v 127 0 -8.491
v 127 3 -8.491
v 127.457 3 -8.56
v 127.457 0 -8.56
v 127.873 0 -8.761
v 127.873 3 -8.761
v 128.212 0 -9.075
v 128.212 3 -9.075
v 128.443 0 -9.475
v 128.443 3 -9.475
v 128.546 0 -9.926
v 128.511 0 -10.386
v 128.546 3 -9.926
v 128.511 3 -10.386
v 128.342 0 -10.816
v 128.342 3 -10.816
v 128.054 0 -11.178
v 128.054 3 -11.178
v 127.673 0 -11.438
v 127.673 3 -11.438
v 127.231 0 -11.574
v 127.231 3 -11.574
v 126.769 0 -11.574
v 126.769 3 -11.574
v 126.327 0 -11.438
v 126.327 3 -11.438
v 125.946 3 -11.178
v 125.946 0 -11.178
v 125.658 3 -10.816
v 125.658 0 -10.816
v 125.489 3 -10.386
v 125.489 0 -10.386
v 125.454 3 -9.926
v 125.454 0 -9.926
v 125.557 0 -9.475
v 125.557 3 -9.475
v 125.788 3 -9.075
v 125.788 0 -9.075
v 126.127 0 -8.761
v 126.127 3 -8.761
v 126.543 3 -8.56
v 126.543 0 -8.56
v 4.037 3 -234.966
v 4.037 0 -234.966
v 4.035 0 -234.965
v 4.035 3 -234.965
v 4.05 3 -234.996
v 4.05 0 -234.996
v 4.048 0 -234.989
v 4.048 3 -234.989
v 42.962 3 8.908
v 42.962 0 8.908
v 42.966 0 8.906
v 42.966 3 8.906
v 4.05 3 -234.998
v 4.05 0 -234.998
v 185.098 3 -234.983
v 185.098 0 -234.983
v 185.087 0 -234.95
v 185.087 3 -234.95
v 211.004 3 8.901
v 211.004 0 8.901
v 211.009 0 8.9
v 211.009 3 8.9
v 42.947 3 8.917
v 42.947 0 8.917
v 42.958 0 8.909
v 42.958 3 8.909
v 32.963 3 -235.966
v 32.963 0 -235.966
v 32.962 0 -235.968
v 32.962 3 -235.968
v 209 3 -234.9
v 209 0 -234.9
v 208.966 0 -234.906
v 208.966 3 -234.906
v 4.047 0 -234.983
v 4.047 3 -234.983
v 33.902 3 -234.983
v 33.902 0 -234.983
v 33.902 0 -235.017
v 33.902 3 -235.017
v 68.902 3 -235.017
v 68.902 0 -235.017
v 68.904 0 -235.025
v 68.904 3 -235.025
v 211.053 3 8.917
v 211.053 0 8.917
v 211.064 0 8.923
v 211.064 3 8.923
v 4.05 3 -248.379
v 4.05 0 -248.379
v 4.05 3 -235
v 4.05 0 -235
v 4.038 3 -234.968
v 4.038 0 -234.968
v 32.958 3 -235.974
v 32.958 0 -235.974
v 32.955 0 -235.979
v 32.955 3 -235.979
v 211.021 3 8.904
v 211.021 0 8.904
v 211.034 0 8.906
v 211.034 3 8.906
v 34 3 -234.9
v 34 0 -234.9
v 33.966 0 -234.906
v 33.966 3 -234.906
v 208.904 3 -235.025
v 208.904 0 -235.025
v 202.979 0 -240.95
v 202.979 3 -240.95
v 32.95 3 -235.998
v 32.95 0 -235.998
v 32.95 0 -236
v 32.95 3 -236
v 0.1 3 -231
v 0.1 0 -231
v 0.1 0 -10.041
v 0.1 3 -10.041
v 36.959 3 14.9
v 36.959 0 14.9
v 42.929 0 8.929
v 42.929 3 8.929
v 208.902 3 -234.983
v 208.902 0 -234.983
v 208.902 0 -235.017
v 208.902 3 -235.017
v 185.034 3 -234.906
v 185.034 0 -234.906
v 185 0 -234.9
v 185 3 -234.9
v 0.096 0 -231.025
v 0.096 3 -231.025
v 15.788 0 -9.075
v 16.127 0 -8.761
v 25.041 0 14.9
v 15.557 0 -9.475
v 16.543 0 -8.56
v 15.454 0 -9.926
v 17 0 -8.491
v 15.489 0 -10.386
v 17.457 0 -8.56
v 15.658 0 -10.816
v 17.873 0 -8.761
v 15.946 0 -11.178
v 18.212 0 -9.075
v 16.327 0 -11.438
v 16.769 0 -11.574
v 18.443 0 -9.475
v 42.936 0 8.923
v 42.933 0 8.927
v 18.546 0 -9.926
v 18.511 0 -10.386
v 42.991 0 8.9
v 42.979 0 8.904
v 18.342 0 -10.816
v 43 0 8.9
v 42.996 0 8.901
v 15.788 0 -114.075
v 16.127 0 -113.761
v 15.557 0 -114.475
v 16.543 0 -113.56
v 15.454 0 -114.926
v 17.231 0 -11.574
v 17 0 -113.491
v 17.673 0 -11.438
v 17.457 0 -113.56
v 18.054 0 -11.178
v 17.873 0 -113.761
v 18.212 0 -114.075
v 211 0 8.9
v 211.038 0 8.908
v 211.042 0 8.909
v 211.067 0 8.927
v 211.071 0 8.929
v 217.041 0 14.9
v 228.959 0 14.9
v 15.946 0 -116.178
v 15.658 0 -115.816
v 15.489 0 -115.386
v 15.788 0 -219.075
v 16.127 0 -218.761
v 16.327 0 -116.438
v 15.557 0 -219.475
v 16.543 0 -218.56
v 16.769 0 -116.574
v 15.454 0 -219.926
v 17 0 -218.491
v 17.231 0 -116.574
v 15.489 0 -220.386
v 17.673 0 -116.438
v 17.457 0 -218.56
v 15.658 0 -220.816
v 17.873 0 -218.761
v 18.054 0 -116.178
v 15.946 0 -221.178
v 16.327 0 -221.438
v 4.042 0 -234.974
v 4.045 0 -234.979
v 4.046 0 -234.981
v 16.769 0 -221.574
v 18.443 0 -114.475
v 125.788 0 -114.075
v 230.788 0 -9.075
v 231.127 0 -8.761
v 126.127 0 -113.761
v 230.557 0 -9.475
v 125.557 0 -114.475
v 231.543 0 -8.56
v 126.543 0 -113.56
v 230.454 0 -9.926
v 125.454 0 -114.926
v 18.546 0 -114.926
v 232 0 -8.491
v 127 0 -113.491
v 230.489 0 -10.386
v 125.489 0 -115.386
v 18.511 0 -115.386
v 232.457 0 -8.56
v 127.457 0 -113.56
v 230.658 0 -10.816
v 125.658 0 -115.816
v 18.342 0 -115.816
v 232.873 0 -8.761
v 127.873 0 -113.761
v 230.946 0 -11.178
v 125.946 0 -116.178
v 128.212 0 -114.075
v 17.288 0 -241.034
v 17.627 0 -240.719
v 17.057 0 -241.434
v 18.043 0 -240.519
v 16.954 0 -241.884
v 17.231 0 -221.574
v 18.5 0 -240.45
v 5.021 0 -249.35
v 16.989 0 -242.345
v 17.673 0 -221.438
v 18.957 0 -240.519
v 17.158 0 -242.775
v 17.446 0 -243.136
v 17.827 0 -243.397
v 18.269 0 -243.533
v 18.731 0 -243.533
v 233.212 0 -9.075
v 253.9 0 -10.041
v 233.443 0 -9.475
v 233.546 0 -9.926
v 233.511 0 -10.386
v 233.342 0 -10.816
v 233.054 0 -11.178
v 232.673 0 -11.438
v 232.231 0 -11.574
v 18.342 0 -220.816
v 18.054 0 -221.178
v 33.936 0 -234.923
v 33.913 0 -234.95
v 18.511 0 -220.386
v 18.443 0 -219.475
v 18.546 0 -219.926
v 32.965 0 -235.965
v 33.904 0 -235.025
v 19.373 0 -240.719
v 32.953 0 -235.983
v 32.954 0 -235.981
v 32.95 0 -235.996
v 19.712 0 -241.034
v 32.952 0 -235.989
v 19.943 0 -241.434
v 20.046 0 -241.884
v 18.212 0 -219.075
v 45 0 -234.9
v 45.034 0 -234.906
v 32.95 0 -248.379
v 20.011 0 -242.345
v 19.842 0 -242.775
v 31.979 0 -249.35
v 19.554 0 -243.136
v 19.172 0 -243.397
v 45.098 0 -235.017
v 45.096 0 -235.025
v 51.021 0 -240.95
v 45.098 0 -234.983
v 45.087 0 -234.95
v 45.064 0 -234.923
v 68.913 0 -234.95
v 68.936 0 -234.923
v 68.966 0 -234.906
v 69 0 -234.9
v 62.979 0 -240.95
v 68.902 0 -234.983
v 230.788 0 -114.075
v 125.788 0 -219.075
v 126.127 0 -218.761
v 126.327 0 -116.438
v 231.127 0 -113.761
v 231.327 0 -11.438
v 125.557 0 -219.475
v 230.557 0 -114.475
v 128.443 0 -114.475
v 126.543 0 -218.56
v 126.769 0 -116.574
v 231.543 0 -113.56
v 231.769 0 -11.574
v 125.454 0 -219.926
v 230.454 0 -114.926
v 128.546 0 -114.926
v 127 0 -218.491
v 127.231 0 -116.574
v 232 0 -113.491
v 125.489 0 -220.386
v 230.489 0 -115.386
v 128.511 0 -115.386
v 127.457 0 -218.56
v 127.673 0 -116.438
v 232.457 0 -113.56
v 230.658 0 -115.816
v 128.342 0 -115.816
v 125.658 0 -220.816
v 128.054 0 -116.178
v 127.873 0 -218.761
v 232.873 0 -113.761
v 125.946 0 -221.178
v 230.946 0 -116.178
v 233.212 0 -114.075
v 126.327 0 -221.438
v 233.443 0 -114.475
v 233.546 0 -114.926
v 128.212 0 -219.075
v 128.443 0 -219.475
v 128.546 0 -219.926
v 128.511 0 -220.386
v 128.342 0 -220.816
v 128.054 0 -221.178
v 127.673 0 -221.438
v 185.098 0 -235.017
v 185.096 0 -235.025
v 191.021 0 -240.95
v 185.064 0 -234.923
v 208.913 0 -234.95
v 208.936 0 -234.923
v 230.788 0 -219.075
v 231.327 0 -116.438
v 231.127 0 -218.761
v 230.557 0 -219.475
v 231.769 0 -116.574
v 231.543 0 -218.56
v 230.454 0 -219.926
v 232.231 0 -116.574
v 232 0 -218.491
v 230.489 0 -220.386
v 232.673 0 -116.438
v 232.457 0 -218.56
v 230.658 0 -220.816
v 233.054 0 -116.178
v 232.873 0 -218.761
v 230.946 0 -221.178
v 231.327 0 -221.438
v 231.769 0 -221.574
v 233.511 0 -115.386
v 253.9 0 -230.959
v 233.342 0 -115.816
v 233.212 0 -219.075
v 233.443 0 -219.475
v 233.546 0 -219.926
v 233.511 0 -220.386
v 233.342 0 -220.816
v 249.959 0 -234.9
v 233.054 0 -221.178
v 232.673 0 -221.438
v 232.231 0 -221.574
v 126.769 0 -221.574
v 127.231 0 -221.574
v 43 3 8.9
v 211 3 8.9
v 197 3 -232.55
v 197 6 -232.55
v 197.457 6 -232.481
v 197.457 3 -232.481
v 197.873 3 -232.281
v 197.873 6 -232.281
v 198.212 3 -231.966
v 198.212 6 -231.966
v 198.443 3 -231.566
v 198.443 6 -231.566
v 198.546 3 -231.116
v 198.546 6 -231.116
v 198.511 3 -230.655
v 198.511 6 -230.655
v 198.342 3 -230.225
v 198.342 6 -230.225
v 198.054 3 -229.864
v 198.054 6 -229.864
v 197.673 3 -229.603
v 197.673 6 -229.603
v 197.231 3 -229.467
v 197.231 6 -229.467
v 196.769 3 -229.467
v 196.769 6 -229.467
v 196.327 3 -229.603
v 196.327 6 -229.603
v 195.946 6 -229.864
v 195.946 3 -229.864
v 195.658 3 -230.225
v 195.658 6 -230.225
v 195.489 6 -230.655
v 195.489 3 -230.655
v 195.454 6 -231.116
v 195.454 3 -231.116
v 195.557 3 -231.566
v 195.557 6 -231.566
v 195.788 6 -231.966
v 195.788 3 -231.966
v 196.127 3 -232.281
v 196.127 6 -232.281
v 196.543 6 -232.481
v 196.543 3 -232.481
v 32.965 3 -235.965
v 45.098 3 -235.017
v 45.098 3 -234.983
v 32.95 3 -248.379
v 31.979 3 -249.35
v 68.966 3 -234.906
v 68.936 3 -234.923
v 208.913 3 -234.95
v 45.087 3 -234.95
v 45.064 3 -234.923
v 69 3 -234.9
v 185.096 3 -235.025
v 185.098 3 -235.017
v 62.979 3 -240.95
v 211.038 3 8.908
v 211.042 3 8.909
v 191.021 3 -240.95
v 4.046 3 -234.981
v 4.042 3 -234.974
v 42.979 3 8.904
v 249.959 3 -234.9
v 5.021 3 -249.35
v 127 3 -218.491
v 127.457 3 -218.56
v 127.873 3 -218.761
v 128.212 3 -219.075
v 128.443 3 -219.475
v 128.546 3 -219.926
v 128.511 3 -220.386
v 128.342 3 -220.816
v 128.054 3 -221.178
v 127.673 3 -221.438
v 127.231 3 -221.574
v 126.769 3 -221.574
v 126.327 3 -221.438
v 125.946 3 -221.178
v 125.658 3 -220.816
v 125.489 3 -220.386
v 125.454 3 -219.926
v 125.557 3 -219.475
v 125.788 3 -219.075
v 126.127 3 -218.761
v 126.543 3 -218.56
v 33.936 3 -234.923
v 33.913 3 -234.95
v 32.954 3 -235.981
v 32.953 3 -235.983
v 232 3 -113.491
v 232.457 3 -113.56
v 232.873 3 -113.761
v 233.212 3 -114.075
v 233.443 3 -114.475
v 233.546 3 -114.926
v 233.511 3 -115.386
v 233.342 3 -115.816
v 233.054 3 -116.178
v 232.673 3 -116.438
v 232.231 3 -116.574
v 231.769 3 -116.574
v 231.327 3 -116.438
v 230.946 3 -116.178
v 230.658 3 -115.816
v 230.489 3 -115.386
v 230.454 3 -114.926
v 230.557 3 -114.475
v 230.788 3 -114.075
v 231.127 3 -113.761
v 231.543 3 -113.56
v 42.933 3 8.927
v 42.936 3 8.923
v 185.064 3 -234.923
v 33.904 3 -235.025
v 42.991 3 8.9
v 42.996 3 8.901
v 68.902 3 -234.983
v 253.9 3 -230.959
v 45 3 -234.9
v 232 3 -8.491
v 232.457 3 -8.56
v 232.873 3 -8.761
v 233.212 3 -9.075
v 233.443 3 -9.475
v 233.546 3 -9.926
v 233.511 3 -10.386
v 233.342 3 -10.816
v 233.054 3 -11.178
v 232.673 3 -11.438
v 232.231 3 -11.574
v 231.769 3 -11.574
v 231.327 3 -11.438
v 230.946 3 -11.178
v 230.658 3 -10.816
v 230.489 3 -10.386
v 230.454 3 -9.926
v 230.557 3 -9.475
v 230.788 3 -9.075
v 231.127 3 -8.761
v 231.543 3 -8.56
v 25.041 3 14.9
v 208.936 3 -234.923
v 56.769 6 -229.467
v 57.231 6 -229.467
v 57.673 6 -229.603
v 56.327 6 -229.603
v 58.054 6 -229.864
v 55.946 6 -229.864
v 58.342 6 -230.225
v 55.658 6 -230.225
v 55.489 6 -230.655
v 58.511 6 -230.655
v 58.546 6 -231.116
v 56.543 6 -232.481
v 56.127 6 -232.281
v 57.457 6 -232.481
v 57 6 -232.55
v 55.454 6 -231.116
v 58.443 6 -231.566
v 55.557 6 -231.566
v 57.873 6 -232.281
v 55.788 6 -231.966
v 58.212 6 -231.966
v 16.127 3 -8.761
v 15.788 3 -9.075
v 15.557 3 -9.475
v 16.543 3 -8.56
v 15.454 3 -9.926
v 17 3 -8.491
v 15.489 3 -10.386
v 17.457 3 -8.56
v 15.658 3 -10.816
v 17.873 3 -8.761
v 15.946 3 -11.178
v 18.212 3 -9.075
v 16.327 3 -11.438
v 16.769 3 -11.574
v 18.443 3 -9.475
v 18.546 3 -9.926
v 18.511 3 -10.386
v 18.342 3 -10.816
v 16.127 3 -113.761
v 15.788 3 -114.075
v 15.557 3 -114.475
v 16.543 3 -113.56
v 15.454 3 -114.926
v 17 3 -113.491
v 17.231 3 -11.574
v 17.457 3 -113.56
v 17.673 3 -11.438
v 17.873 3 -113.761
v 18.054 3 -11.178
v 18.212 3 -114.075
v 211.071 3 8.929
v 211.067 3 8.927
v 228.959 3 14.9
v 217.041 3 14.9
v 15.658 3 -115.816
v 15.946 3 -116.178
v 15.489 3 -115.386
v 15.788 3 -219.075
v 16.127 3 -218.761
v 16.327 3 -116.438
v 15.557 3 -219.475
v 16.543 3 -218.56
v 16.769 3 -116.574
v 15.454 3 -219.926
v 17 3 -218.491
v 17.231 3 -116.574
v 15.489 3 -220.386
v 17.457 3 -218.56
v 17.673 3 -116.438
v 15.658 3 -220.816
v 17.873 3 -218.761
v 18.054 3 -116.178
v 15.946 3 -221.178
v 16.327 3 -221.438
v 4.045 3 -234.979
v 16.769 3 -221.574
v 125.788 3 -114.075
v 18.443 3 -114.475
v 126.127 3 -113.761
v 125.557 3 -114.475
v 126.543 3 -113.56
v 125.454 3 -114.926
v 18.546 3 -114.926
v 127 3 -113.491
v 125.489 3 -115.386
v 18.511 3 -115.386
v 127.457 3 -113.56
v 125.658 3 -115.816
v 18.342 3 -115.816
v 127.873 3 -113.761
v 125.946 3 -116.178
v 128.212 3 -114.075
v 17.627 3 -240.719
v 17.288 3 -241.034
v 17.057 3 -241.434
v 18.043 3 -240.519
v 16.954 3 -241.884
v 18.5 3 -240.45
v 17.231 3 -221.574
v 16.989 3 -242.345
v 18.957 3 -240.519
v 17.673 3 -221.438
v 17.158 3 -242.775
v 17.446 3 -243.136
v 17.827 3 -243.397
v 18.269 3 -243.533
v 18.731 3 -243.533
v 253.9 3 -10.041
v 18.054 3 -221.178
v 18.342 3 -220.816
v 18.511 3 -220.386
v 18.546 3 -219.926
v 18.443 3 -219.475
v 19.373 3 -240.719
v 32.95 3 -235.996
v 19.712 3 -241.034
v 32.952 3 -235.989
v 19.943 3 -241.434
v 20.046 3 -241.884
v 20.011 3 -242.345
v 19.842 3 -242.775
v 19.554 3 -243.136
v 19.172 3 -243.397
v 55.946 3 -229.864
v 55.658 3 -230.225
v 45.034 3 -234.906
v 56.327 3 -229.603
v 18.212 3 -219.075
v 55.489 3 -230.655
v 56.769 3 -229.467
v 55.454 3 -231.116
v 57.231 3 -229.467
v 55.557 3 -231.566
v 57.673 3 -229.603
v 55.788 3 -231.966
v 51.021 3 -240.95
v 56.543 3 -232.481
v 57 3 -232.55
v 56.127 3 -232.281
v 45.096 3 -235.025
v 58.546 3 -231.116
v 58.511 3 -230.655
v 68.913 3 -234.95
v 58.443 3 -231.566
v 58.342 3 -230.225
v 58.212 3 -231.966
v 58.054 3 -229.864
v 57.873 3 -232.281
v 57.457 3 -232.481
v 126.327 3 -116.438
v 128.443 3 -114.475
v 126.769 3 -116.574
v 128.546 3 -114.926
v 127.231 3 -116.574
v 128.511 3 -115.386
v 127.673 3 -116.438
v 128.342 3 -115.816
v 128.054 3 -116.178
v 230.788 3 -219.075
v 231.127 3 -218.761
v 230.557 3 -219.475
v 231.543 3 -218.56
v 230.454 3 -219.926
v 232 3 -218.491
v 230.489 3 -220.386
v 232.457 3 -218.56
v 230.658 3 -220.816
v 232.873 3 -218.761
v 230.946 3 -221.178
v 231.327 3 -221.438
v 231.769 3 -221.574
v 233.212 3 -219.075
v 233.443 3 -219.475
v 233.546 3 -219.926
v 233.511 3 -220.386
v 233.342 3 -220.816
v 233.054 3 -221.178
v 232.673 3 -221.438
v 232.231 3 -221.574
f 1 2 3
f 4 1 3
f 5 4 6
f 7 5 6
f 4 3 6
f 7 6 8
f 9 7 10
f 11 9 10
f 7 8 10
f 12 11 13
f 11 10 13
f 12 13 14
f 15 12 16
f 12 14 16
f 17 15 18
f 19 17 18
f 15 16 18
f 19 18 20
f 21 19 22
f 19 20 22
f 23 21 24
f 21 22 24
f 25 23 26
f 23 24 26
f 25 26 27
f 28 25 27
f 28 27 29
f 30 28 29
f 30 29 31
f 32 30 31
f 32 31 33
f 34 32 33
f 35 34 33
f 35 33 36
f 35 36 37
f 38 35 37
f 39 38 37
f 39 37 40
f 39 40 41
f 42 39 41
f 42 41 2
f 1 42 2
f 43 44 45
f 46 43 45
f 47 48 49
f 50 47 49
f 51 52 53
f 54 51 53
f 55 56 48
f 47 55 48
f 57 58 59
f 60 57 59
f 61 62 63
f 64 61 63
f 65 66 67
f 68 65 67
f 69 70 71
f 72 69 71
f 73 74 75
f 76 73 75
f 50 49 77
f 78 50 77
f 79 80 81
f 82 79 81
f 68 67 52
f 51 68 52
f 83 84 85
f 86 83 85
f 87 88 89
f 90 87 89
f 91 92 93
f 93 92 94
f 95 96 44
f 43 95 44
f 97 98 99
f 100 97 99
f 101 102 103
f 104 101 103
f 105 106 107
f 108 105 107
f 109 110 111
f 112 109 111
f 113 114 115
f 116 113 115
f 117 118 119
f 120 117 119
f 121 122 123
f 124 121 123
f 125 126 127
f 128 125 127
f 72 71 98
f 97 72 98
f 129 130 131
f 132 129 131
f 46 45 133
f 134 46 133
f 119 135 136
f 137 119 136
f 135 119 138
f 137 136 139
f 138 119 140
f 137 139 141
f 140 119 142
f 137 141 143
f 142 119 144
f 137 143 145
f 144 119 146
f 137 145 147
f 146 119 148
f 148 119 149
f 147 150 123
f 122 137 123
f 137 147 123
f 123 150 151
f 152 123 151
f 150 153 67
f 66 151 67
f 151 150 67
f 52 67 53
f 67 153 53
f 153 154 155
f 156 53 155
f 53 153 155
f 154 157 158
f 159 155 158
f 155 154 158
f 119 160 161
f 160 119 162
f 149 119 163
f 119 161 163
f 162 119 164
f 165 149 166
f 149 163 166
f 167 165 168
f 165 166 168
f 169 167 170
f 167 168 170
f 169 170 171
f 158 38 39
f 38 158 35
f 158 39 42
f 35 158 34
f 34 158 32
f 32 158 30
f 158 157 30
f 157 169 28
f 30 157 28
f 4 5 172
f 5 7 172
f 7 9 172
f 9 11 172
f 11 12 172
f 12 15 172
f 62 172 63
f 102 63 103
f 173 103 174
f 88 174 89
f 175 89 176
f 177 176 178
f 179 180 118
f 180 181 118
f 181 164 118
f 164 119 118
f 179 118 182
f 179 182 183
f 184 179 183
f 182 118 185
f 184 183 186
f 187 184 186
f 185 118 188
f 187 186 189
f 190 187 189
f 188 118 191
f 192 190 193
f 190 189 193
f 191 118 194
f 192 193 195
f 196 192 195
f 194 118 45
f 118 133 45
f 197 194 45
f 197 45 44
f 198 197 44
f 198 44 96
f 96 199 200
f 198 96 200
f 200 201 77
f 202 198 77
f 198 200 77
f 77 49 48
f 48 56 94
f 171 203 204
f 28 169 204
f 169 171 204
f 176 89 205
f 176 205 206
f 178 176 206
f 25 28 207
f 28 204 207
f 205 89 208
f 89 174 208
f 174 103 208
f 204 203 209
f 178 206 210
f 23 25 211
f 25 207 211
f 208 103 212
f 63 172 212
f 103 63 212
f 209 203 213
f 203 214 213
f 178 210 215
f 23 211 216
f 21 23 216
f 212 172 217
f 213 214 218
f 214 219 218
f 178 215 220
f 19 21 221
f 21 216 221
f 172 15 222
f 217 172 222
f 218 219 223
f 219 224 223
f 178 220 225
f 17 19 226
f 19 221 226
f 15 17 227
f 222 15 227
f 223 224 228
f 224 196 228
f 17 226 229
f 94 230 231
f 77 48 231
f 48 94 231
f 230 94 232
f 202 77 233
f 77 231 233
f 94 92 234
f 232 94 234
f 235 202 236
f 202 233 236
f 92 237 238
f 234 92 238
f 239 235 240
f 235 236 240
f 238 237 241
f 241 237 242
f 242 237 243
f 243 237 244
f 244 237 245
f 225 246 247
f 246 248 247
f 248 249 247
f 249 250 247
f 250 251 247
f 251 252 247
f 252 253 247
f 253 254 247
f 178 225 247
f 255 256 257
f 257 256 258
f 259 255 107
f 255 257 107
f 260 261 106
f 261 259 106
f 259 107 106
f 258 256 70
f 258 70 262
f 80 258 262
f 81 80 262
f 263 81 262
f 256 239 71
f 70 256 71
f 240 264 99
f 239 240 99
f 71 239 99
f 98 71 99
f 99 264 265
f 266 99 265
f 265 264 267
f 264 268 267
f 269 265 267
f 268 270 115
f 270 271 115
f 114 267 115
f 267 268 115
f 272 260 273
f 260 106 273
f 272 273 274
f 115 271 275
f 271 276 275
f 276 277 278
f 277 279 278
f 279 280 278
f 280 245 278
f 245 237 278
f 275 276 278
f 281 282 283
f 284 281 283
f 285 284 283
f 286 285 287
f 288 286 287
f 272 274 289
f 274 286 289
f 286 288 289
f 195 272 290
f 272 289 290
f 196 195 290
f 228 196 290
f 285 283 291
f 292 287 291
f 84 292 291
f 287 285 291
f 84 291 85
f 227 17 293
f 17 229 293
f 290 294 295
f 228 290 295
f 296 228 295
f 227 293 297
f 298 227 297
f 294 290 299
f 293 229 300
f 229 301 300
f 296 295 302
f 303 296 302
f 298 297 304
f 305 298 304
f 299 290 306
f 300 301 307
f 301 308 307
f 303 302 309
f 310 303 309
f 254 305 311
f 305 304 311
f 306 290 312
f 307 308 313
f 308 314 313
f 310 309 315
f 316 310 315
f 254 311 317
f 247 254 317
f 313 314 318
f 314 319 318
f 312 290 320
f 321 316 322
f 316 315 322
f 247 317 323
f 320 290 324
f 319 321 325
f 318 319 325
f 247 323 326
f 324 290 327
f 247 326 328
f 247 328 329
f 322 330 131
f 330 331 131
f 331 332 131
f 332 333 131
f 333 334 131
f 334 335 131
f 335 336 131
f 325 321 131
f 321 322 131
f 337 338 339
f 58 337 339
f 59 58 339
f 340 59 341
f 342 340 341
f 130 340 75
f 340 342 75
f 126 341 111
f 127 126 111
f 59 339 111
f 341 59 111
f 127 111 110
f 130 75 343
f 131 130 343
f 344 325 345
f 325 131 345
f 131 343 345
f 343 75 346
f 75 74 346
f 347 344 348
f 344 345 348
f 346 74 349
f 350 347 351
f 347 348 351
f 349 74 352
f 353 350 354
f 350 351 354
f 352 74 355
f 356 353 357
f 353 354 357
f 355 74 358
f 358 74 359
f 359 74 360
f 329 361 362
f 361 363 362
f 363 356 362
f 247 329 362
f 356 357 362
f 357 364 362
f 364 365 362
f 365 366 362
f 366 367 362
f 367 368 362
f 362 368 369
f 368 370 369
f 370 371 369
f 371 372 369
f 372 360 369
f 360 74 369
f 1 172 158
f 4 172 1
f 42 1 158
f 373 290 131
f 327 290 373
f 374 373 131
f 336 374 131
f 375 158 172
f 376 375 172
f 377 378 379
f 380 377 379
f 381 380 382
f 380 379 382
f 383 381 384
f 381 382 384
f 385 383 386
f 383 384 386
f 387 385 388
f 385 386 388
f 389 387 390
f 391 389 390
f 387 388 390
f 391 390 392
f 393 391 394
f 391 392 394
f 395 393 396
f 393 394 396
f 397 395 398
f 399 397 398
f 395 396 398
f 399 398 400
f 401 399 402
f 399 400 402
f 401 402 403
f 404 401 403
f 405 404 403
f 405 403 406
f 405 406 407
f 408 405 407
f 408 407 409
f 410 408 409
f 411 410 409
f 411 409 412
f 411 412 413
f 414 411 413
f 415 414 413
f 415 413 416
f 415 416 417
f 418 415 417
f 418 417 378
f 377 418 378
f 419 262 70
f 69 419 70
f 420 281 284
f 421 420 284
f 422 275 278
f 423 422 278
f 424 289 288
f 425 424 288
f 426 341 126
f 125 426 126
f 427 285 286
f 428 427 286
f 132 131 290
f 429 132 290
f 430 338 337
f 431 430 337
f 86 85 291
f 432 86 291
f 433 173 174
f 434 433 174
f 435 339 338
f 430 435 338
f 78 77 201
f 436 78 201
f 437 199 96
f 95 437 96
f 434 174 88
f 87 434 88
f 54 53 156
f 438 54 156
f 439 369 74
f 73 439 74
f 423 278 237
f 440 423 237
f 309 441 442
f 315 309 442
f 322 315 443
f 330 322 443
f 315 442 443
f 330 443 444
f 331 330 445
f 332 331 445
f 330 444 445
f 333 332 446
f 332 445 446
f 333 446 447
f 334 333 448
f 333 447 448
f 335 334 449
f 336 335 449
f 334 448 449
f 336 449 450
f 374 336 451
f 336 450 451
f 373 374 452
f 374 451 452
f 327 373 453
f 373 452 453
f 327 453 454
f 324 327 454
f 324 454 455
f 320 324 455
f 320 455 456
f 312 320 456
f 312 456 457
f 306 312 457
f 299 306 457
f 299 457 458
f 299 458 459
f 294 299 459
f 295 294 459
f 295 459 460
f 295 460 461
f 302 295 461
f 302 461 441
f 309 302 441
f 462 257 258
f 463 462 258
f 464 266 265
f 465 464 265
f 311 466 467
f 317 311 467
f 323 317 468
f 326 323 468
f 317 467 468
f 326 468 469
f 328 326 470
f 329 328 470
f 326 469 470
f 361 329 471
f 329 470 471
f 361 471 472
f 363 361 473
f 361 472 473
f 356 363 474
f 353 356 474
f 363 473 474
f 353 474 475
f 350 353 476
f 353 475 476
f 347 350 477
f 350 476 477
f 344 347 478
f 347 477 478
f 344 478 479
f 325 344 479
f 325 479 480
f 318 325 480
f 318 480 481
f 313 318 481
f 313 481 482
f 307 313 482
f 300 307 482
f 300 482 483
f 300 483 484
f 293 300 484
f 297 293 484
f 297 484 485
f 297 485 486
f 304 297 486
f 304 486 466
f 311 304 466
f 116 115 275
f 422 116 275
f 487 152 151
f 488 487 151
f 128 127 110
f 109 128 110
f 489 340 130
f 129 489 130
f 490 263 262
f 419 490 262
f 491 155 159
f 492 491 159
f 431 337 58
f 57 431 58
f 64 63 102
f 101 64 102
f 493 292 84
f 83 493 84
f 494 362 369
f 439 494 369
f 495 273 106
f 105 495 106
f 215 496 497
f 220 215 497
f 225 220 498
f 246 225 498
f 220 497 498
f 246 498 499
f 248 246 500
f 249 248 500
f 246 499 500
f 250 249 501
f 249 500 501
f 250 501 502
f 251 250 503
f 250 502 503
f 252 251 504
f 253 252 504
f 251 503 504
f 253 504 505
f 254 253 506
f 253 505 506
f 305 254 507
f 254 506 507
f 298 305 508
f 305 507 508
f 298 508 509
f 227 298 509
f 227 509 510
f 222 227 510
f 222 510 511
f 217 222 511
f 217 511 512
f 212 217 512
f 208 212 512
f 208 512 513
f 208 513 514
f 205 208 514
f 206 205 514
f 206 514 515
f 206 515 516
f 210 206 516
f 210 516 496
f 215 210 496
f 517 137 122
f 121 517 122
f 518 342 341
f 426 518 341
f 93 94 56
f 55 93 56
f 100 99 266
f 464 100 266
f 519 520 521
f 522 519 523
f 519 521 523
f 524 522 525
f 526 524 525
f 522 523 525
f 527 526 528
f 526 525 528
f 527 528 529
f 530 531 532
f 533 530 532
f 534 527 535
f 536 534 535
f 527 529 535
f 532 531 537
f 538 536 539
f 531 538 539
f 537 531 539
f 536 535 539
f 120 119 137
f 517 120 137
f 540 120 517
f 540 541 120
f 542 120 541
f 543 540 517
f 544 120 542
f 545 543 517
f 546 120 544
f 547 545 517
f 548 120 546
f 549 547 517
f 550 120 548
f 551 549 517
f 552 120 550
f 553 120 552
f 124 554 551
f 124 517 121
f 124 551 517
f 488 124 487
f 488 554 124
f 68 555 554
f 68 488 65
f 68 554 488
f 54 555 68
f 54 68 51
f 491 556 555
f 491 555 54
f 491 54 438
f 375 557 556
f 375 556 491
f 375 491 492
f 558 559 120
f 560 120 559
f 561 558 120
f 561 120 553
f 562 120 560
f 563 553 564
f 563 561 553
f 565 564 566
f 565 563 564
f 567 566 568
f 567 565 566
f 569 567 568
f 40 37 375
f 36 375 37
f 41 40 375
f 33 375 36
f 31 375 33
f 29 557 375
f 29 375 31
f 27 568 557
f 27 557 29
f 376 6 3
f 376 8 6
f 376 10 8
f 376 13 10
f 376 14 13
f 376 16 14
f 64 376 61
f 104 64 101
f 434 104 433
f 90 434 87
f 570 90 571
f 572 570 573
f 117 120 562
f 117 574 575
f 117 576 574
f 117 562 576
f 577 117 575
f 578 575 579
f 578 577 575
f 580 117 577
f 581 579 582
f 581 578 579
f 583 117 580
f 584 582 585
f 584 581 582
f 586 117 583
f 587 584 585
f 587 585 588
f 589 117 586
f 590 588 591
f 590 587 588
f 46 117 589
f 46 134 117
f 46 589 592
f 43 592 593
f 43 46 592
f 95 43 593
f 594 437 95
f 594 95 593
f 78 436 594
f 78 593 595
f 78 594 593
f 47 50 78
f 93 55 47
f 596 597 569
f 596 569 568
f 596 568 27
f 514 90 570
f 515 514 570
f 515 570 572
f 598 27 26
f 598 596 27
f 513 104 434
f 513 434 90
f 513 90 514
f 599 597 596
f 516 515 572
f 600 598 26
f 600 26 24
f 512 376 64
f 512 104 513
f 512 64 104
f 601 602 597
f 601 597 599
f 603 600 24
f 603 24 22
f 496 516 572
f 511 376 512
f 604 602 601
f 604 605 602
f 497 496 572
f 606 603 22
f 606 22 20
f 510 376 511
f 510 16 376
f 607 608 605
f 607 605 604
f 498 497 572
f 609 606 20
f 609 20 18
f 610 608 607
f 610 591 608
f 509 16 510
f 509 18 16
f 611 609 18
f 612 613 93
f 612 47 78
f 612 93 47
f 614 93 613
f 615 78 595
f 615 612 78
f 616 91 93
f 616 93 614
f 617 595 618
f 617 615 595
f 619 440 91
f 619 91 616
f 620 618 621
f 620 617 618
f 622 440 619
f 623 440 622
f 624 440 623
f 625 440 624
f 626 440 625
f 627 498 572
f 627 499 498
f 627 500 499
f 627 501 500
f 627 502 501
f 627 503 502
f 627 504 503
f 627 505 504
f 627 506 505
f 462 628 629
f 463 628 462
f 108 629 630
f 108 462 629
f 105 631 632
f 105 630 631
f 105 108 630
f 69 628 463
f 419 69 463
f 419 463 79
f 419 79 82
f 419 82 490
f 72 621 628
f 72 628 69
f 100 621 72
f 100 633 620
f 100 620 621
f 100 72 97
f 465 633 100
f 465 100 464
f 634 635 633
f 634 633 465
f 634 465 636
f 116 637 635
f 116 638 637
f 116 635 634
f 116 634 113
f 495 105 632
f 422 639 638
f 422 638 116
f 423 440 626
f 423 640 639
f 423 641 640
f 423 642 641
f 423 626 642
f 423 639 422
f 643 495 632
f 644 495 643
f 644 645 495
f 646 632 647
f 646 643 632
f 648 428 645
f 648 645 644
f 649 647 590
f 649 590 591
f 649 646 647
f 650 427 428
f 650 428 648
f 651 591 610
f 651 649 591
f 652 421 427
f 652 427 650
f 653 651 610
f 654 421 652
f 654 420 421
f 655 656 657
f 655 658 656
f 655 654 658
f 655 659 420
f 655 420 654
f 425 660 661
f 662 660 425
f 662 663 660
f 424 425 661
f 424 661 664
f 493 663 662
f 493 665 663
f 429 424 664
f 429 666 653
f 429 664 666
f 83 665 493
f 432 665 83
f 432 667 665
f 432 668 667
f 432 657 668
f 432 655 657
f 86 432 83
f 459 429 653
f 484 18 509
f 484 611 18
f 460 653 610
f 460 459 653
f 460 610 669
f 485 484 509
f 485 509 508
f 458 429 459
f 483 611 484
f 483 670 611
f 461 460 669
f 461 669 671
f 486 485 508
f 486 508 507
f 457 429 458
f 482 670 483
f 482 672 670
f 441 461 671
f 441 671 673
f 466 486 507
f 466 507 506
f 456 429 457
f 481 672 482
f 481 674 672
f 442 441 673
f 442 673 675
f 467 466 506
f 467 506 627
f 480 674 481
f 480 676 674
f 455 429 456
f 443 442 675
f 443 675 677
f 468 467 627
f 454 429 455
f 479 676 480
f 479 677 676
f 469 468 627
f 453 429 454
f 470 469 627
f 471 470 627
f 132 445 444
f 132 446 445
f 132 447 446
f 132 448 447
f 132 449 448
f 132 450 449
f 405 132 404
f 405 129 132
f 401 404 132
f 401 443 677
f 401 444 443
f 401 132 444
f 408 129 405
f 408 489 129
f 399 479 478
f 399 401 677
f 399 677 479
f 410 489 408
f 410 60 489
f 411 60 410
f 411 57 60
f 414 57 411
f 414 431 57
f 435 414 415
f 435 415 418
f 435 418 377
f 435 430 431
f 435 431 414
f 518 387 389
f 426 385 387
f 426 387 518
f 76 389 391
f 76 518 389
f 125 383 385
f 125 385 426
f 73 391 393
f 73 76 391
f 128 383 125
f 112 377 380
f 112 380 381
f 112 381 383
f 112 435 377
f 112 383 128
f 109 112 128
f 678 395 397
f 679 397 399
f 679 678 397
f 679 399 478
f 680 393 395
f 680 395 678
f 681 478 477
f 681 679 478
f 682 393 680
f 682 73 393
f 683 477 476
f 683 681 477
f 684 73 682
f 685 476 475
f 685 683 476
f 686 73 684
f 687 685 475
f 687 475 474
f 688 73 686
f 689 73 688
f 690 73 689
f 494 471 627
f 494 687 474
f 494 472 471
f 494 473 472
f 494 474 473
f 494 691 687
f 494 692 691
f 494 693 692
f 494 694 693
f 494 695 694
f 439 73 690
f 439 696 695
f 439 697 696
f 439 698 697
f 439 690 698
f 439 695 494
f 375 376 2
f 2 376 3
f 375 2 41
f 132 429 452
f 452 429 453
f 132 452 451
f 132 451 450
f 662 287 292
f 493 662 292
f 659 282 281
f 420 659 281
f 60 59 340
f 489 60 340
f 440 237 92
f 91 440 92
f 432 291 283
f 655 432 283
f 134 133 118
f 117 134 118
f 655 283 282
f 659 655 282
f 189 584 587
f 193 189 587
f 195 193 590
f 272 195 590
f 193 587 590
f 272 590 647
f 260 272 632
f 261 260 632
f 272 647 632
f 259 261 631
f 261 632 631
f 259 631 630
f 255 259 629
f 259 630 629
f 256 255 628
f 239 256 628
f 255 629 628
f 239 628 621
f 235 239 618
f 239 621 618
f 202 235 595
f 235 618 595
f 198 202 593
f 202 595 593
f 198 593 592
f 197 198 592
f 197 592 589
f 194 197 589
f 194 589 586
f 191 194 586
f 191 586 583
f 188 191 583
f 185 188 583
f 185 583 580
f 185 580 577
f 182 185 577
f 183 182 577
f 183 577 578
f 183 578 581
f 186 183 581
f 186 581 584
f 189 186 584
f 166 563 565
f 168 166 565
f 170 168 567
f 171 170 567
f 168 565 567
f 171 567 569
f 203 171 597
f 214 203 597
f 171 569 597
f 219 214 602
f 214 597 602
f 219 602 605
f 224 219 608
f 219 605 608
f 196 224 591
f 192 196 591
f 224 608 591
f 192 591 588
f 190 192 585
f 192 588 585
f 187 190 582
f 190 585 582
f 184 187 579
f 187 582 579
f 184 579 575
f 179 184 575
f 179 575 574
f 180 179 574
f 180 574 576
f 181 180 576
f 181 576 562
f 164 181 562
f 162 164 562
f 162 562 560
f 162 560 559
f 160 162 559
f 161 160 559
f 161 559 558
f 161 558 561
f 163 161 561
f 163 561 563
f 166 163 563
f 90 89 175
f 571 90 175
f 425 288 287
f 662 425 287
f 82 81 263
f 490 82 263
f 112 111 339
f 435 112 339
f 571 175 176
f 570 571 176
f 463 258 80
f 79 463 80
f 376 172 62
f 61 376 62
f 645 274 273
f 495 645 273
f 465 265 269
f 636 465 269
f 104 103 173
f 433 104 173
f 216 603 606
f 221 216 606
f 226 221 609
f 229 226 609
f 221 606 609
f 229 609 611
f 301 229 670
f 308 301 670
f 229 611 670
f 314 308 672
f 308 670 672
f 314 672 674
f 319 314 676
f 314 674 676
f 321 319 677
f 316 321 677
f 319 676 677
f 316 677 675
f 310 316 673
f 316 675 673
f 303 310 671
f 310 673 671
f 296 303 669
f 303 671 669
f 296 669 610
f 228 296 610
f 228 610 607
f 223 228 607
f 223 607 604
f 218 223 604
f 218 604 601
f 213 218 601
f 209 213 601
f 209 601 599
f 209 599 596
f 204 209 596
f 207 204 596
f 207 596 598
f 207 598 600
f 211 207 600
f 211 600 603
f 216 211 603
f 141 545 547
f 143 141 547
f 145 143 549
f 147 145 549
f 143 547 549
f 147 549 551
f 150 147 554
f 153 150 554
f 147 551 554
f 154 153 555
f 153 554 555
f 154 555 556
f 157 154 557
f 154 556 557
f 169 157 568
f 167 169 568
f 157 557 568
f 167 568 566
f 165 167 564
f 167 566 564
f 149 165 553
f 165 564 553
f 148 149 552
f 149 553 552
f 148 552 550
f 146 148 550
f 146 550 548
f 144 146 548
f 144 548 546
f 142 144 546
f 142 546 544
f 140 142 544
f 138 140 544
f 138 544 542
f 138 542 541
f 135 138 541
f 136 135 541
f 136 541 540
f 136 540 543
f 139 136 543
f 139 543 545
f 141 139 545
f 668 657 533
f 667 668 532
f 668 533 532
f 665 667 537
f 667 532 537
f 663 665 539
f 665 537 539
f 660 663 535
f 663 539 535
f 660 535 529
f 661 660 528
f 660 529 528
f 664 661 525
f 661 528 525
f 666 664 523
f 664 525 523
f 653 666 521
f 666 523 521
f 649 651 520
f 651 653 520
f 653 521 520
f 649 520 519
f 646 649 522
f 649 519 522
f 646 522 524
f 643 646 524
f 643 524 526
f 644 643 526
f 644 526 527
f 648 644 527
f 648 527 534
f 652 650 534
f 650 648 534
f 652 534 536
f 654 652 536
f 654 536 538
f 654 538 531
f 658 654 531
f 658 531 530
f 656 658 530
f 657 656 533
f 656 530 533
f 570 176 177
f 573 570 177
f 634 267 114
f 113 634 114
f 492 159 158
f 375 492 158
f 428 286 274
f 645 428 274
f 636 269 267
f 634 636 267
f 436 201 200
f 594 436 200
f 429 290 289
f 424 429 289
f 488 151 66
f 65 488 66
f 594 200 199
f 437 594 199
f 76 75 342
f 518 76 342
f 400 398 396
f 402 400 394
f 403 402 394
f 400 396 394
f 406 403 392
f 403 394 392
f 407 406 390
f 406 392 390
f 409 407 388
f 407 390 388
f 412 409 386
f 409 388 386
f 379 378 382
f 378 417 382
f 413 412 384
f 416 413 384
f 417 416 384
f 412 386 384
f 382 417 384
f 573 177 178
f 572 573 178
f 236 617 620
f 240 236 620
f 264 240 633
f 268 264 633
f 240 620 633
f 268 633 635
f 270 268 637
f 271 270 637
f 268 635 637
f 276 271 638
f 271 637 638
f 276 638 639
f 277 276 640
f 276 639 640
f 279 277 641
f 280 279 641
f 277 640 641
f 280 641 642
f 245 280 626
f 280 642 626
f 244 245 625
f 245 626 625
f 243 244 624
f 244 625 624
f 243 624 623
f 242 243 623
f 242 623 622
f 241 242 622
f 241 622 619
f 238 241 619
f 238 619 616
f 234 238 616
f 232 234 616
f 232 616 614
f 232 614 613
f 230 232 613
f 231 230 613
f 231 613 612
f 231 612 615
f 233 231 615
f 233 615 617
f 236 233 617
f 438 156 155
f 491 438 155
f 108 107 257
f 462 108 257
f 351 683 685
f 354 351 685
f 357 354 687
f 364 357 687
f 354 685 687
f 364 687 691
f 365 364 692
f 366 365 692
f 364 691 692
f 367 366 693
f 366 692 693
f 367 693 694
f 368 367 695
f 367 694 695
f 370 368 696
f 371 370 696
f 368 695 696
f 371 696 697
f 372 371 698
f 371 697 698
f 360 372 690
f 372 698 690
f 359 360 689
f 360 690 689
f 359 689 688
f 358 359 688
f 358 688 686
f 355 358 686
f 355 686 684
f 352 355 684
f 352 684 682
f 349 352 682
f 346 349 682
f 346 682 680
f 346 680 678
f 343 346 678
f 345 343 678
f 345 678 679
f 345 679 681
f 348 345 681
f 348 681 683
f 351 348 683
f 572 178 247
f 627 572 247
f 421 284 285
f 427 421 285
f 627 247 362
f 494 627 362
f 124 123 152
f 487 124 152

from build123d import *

# Parameters (mm, degrees)
BOSS_EXTRUDE1_DEPTH = 3
SKETCH2_R           = 1.55
CUT_EXTRUDE1_DEPTH  = 356.878676658
BOSS_EXTRUDE3_START = -6
SKETCH3_R           = 1.55
BOSS_EXTRUDE3_DEPTH = 6


with BuildPart() as part:
    # Sketch1 → Boss-Extrude1 (new body)
    with BuildSketch(Plane(origin=(0, 0, 0), x_dir=(1, 0, 0), z_dir=(0, 1, 0))):
        Polygon((5.02071, 249.35), (4.05, 248.379), (4.05, 235), (4.04962, 234.998), (4.04981, 234.996), (4.04812, 234.989), (4.04698, 234.983), (4.04588, 234.981), (4.04531, 234.979), (4.04157, 234.974), (4.0383, 234.968), (4.03662, 234.966), (4.03536, 234.965), (0.095609, 231.025), (0.1, 231), (0.1, 10.0414), (25.0414, -14.9), (36.9586, -14.9), (42.9293, -8.92929), (42.9329, -8.92677), (42.9357, -8.9234), (42.947, -8.91686), (42.9577, -8.90937), (42.962, -8.90823), (42.9658, -8.90603), (42.9787, -8.90376), (42.9913, -8.90038), (42.9957, -8.90076), (43, -8.9), (211, -8.9), (211.004, -8.90076), (211.009, -8.90038), (211.021, -8.90376), (211.034, -8.90603), (211.038, -8.90823), (211.042, -8.90937), (211.053, -8.91687), (211.064, -8.9234), (211.067, -8.92676), (211.071, -8.92929), (217.041, -14.9), (228.959, -14.9), (253.9, 10.0414), (253.9, 230.959), (249.959, 234.9), (209, 234.9), (208.966, 234.906), (208.936, 234.923), (208.913, 234.95), (208.902, 234.983), (208.902, 235.017), (208.904, 235.025), (202.979, 240.95), (191.021, 240.95), (185.096, 235.025), (185.098, 235.017), (185.098, 234.983), (185.087, 234.95), (185.064, 234.923), (185.034, 234.906), (185, 234.9), (69, 234.9), (68.9658, 234.906), (68.9357, 234.923), (68.9134, 234.95), (68.9015, 234.983), (68.9015, 235.017), (68.9043, 235.025), (62.9793, 240.95), (51.0207, 240.95), (45.0957, 235.025), (45.0985, 235.017), (45.0985, 234.983), (45.0866, 234.95), (45.0643, 234.923), (45.0342, 234.906), (45, 234.9), (34, 234.9), (33.9658, 234.906), (33.9357, 234.923), (33.9134, 234.95), (33.9015, 234.983), (33.9015, 235.017), (33.9043, 235.025), (32.9646, 235.965), (32.9634, 235.966), (32.9617, 235.968), (32.9584, 235.974), (32.9547, 235.979), (32.9541, 235.981), (32.953, 235.983), (32.9519, 235.989), (32.9502, 235.996), (32.9504, 235.998), (32.95, 236), (32.95, 248.379), (31.9793, 249.35), align=None)
    extrude(amount=BOSS_EXTRUDE1_DEPTH)

    # Sketch2 → Cut-Extrude1 (cut, through all)
    with BuildSketch(Plane(origin=(0, 3, 0), x_dir=(1, 0, 0), z_dir=(0, 1, 0))):
        with Locations(Location((17, 10.0414, 0), (0, 0, 270))):
            Circle(SKETCH2_R)
        with Locations(Location((127, 10.0414, 0), (0, 0, 270))):
            Circle(SKETCH2_R)
        with Locations(Location((232, 10.0414, 0), (0, 0, 270))):
            Circle(SKETCH2_R)
        with Locations(Location((232, 115.0414, 0), (0, 0, 270))):
            Circle(SKETCH2_R)
        with Locations(Location((232, 220.0414, 0), (0, 0, 270))):
            Circle(SKETCH2_R)
        with Locations(Location((127, 115.0414, 0), (0, 0, 270))):
            Circle(SKETCH2_R)
        with Locations(Location((17, 115.0414, 0), (0, 0, 270))):
            Circle(SKETCH2_R)
        with Locations(Location((17, 220.0414, 0), (0, 0, 270))):
            Circle(SKETCH2_R)
        with Locations(Location((127, 220.0414, 0), (0, 0, 270))):
            Circle(SKETCH2_R)
        with Locations(Location((197, 231, 0), (0, 0, 270))):
            Circle(SKETCH2_R)
        with Locations(Location((57, 231, 0), (0, 0, 270))):
            Circle(SKETCH2_R)
        with Locations(Location((18.499978099, 242, 0), (0, 0, 270))):
            Circle(SKETCH2_R)
    extrude(amount=-CUT_EXTRUDE1_DEPTH, mode=Mode.SUBTRACT)

    # Sketch3 → Boss-Extrude3 (add)
    with BuildSketch(Plane.XZ.offset(BOSS_EXTRUDE3_START)):
        with Locations(Location((57, -231, 0), (0, 0, 270))):
            Circle(SKETCH3_R)
        with Locations(Location((197, -231, 0), (0, 0, 270))):
            Circle(SKETCH3_R)
    extrude(amount=BOSS_EXTRUDE3_DEPTH)


solid = part.part
